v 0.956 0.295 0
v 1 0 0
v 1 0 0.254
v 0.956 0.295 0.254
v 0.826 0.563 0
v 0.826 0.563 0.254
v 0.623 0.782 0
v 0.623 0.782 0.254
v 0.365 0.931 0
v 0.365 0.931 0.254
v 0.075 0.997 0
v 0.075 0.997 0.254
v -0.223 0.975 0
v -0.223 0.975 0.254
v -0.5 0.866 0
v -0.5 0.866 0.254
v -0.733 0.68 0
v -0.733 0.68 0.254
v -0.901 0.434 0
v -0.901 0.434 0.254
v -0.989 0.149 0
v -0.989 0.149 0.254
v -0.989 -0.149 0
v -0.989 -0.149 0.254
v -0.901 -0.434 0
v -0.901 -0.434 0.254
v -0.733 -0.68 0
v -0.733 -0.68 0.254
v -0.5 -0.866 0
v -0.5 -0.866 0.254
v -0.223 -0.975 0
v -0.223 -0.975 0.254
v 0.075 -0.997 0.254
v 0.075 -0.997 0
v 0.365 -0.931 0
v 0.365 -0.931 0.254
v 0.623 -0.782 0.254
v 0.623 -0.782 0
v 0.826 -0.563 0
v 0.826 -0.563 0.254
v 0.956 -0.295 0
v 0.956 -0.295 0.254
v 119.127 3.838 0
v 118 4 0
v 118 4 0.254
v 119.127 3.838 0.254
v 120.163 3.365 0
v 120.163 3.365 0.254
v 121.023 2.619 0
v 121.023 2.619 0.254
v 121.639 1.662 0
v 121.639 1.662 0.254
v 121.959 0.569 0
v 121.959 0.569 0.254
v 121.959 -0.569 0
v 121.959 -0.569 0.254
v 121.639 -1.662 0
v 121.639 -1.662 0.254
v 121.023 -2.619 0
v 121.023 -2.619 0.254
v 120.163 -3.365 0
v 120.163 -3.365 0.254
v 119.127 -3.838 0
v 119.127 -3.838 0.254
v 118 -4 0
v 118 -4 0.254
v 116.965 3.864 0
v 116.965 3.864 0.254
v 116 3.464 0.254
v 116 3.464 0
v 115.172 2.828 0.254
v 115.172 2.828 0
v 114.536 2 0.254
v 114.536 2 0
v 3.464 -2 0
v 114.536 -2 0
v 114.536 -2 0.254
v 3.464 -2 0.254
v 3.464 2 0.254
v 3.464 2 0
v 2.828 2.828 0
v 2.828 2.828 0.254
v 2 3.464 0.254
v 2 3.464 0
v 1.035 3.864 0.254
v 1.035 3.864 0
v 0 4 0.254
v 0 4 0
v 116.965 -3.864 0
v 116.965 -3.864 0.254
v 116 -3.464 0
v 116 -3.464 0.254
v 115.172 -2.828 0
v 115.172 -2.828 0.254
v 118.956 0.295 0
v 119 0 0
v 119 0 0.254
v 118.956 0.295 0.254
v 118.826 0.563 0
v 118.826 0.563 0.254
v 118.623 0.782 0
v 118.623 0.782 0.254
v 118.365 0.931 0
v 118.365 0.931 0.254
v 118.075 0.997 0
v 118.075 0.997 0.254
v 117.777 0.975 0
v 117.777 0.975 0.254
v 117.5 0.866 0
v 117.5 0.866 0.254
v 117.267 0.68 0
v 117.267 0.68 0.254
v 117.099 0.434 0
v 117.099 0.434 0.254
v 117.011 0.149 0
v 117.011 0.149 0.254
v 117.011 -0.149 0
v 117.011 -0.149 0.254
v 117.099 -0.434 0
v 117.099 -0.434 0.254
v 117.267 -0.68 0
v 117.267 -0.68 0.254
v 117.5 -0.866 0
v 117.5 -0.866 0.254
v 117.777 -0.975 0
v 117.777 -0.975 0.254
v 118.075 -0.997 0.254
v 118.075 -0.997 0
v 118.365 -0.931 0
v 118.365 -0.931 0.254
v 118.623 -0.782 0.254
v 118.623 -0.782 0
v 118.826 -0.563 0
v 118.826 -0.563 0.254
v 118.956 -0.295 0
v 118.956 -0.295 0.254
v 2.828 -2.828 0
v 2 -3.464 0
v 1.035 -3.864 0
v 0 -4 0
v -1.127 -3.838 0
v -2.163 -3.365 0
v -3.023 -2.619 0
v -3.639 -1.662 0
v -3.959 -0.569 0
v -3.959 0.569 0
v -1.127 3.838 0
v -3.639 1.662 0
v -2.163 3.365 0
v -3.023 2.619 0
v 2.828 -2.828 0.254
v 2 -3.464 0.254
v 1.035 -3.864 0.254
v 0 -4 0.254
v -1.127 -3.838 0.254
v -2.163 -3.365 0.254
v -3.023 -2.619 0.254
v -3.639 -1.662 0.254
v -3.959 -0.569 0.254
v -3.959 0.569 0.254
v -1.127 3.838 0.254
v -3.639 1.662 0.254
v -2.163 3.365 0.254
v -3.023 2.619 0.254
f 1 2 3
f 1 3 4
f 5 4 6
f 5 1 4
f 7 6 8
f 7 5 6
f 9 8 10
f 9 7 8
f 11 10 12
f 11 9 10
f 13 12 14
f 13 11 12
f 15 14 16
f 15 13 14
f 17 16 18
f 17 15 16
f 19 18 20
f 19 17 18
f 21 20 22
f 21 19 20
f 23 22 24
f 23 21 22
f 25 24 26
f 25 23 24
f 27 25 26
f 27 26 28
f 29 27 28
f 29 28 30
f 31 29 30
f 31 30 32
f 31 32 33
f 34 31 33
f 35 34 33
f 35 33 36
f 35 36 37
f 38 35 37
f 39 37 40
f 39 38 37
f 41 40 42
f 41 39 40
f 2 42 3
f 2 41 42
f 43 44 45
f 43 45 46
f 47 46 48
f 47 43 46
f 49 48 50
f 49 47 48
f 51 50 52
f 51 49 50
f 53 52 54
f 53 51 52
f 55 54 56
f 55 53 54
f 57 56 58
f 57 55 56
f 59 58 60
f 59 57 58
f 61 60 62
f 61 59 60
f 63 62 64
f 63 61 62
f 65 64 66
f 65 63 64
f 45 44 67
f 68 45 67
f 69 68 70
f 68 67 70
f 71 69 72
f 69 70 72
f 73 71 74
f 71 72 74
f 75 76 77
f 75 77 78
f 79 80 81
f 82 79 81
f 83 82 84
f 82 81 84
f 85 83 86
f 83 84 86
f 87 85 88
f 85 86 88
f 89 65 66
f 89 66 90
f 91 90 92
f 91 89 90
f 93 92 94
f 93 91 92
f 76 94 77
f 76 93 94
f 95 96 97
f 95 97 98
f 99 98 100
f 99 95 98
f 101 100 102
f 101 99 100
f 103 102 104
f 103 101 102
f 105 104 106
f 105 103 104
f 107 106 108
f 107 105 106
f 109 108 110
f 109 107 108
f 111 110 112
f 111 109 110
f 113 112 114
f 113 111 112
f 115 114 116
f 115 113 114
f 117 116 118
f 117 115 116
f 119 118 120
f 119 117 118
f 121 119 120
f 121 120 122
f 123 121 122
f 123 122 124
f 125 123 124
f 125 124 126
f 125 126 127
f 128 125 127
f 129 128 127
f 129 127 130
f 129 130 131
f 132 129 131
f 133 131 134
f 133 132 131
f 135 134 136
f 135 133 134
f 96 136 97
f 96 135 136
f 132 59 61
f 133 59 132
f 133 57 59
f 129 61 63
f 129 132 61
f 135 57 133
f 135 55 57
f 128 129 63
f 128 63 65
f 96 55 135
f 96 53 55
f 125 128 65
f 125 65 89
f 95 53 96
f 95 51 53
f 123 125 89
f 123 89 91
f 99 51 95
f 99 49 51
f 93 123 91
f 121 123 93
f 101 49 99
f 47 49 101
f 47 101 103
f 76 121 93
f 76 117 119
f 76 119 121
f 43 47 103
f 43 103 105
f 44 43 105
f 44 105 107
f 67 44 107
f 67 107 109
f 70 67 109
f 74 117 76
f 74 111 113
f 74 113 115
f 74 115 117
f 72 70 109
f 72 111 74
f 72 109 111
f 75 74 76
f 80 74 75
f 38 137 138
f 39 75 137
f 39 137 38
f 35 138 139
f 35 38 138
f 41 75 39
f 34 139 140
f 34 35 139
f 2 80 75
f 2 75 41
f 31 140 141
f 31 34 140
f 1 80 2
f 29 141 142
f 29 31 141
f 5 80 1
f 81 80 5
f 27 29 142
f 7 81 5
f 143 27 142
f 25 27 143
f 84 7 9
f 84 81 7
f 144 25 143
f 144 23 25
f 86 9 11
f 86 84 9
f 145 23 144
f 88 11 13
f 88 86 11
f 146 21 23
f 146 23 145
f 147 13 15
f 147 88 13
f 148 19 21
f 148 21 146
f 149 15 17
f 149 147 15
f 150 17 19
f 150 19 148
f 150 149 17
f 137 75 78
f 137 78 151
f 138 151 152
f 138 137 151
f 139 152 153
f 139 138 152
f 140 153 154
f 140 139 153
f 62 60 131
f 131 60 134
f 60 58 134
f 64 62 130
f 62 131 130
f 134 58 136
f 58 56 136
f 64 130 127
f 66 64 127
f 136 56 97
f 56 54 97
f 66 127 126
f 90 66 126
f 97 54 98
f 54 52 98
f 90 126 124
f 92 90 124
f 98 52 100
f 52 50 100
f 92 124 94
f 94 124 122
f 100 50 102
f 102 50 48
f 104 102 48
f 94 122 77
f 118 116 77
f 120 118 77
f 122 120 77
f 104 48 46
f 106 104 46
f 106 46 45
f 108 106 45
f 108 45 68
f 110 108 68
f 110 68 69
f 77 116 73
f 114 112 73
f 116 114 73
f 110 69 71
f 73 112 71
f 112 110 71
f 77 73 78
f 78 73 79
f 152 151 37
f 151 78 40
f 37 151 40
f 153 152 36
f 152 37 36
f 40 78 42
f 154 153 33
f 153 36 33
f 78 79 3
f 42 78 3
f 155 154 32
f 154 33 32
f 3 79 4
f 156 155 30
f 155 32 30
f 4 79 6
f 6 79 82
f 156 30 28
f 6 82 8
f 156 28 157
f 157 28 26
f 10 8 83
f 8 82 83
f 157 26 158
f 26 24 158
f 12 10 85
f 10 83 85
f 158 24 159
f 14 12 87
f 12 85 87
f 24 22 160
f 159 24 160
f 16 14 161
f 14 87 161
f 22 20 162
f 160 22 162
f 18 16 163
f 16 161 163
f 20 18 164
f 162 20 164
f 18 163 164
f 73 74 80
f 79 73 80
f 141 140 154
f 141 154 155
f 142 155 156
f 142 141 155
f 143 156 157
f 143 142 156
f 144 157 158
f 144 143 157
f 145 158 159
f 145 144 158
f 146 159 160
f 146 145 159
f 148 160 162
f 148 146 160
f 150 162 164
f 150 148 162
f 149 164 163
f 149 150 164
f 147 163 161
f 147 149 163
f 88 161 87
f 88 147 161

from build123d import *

# Parameters (mm, degrees)
SKETCH1_R           = 1
BOSS_EXTRUDE1_DEPTH = 0.254
CUT_EXTRUDE1_DEPTH  = 1.254


with BuildPart() as part:
    # Sketch1 → Boss-Extrude1 (new body)
    with BuildSketch(Plane.XY):
        with BuildLine():
            Line((0, 4), (118, 4))
            ThreePointArc((118, 4), (122, 0), (118, -4))
            Line((118, -4), (0, -4))
            ThreePointArc((0, -4), (-4, 0), (0, 4))
        make_face()
        Circle(SKETCH1_R, mode=Mode.SUBTRACT)
        with Locations((118, 0)):
            Circle(SKETCH1_R, mode=Mode.SUBTRACT)
    extrude(amount=BOSS_EXTRUDE1_DEPTH)

    # Sketch2 → Cut-Extrude1 (cut, through all)
    with BuildSketch(Plane(origin=(0, 0, 0), x_dir=(-1, 0, 0), z_dir=(0, 0, -1))):
        with BuildLine():
            Line((-114.535898385, 2), (-3.464101615, 2))
            ThreePointArc((-3.464101615, 2), (-2, 3.464101615), (0, 4))
            Line((0, 4), (-118, 4))
            ThreePointArc((-118, 4), (-116, 3.464101615), (-114.535898385, 2))
        make_face()
        with BuildLine():
            Line((-114.535898385, -2), (-3.464101615, -2))
            ThreePointArc((-3.464101615, -2), (-2, -3.464101615), (0, -4))
            Line((0, -4), (-118, -4))
            ThreePointArc((-118, -4), (-116, -3.464101615), (-114.535898385, -2))
        make_face()
    extrude(amount=-CUT_EXTRUDE1_DEPTH, mode=Mode.SUBTRACT)


solid = part.part
